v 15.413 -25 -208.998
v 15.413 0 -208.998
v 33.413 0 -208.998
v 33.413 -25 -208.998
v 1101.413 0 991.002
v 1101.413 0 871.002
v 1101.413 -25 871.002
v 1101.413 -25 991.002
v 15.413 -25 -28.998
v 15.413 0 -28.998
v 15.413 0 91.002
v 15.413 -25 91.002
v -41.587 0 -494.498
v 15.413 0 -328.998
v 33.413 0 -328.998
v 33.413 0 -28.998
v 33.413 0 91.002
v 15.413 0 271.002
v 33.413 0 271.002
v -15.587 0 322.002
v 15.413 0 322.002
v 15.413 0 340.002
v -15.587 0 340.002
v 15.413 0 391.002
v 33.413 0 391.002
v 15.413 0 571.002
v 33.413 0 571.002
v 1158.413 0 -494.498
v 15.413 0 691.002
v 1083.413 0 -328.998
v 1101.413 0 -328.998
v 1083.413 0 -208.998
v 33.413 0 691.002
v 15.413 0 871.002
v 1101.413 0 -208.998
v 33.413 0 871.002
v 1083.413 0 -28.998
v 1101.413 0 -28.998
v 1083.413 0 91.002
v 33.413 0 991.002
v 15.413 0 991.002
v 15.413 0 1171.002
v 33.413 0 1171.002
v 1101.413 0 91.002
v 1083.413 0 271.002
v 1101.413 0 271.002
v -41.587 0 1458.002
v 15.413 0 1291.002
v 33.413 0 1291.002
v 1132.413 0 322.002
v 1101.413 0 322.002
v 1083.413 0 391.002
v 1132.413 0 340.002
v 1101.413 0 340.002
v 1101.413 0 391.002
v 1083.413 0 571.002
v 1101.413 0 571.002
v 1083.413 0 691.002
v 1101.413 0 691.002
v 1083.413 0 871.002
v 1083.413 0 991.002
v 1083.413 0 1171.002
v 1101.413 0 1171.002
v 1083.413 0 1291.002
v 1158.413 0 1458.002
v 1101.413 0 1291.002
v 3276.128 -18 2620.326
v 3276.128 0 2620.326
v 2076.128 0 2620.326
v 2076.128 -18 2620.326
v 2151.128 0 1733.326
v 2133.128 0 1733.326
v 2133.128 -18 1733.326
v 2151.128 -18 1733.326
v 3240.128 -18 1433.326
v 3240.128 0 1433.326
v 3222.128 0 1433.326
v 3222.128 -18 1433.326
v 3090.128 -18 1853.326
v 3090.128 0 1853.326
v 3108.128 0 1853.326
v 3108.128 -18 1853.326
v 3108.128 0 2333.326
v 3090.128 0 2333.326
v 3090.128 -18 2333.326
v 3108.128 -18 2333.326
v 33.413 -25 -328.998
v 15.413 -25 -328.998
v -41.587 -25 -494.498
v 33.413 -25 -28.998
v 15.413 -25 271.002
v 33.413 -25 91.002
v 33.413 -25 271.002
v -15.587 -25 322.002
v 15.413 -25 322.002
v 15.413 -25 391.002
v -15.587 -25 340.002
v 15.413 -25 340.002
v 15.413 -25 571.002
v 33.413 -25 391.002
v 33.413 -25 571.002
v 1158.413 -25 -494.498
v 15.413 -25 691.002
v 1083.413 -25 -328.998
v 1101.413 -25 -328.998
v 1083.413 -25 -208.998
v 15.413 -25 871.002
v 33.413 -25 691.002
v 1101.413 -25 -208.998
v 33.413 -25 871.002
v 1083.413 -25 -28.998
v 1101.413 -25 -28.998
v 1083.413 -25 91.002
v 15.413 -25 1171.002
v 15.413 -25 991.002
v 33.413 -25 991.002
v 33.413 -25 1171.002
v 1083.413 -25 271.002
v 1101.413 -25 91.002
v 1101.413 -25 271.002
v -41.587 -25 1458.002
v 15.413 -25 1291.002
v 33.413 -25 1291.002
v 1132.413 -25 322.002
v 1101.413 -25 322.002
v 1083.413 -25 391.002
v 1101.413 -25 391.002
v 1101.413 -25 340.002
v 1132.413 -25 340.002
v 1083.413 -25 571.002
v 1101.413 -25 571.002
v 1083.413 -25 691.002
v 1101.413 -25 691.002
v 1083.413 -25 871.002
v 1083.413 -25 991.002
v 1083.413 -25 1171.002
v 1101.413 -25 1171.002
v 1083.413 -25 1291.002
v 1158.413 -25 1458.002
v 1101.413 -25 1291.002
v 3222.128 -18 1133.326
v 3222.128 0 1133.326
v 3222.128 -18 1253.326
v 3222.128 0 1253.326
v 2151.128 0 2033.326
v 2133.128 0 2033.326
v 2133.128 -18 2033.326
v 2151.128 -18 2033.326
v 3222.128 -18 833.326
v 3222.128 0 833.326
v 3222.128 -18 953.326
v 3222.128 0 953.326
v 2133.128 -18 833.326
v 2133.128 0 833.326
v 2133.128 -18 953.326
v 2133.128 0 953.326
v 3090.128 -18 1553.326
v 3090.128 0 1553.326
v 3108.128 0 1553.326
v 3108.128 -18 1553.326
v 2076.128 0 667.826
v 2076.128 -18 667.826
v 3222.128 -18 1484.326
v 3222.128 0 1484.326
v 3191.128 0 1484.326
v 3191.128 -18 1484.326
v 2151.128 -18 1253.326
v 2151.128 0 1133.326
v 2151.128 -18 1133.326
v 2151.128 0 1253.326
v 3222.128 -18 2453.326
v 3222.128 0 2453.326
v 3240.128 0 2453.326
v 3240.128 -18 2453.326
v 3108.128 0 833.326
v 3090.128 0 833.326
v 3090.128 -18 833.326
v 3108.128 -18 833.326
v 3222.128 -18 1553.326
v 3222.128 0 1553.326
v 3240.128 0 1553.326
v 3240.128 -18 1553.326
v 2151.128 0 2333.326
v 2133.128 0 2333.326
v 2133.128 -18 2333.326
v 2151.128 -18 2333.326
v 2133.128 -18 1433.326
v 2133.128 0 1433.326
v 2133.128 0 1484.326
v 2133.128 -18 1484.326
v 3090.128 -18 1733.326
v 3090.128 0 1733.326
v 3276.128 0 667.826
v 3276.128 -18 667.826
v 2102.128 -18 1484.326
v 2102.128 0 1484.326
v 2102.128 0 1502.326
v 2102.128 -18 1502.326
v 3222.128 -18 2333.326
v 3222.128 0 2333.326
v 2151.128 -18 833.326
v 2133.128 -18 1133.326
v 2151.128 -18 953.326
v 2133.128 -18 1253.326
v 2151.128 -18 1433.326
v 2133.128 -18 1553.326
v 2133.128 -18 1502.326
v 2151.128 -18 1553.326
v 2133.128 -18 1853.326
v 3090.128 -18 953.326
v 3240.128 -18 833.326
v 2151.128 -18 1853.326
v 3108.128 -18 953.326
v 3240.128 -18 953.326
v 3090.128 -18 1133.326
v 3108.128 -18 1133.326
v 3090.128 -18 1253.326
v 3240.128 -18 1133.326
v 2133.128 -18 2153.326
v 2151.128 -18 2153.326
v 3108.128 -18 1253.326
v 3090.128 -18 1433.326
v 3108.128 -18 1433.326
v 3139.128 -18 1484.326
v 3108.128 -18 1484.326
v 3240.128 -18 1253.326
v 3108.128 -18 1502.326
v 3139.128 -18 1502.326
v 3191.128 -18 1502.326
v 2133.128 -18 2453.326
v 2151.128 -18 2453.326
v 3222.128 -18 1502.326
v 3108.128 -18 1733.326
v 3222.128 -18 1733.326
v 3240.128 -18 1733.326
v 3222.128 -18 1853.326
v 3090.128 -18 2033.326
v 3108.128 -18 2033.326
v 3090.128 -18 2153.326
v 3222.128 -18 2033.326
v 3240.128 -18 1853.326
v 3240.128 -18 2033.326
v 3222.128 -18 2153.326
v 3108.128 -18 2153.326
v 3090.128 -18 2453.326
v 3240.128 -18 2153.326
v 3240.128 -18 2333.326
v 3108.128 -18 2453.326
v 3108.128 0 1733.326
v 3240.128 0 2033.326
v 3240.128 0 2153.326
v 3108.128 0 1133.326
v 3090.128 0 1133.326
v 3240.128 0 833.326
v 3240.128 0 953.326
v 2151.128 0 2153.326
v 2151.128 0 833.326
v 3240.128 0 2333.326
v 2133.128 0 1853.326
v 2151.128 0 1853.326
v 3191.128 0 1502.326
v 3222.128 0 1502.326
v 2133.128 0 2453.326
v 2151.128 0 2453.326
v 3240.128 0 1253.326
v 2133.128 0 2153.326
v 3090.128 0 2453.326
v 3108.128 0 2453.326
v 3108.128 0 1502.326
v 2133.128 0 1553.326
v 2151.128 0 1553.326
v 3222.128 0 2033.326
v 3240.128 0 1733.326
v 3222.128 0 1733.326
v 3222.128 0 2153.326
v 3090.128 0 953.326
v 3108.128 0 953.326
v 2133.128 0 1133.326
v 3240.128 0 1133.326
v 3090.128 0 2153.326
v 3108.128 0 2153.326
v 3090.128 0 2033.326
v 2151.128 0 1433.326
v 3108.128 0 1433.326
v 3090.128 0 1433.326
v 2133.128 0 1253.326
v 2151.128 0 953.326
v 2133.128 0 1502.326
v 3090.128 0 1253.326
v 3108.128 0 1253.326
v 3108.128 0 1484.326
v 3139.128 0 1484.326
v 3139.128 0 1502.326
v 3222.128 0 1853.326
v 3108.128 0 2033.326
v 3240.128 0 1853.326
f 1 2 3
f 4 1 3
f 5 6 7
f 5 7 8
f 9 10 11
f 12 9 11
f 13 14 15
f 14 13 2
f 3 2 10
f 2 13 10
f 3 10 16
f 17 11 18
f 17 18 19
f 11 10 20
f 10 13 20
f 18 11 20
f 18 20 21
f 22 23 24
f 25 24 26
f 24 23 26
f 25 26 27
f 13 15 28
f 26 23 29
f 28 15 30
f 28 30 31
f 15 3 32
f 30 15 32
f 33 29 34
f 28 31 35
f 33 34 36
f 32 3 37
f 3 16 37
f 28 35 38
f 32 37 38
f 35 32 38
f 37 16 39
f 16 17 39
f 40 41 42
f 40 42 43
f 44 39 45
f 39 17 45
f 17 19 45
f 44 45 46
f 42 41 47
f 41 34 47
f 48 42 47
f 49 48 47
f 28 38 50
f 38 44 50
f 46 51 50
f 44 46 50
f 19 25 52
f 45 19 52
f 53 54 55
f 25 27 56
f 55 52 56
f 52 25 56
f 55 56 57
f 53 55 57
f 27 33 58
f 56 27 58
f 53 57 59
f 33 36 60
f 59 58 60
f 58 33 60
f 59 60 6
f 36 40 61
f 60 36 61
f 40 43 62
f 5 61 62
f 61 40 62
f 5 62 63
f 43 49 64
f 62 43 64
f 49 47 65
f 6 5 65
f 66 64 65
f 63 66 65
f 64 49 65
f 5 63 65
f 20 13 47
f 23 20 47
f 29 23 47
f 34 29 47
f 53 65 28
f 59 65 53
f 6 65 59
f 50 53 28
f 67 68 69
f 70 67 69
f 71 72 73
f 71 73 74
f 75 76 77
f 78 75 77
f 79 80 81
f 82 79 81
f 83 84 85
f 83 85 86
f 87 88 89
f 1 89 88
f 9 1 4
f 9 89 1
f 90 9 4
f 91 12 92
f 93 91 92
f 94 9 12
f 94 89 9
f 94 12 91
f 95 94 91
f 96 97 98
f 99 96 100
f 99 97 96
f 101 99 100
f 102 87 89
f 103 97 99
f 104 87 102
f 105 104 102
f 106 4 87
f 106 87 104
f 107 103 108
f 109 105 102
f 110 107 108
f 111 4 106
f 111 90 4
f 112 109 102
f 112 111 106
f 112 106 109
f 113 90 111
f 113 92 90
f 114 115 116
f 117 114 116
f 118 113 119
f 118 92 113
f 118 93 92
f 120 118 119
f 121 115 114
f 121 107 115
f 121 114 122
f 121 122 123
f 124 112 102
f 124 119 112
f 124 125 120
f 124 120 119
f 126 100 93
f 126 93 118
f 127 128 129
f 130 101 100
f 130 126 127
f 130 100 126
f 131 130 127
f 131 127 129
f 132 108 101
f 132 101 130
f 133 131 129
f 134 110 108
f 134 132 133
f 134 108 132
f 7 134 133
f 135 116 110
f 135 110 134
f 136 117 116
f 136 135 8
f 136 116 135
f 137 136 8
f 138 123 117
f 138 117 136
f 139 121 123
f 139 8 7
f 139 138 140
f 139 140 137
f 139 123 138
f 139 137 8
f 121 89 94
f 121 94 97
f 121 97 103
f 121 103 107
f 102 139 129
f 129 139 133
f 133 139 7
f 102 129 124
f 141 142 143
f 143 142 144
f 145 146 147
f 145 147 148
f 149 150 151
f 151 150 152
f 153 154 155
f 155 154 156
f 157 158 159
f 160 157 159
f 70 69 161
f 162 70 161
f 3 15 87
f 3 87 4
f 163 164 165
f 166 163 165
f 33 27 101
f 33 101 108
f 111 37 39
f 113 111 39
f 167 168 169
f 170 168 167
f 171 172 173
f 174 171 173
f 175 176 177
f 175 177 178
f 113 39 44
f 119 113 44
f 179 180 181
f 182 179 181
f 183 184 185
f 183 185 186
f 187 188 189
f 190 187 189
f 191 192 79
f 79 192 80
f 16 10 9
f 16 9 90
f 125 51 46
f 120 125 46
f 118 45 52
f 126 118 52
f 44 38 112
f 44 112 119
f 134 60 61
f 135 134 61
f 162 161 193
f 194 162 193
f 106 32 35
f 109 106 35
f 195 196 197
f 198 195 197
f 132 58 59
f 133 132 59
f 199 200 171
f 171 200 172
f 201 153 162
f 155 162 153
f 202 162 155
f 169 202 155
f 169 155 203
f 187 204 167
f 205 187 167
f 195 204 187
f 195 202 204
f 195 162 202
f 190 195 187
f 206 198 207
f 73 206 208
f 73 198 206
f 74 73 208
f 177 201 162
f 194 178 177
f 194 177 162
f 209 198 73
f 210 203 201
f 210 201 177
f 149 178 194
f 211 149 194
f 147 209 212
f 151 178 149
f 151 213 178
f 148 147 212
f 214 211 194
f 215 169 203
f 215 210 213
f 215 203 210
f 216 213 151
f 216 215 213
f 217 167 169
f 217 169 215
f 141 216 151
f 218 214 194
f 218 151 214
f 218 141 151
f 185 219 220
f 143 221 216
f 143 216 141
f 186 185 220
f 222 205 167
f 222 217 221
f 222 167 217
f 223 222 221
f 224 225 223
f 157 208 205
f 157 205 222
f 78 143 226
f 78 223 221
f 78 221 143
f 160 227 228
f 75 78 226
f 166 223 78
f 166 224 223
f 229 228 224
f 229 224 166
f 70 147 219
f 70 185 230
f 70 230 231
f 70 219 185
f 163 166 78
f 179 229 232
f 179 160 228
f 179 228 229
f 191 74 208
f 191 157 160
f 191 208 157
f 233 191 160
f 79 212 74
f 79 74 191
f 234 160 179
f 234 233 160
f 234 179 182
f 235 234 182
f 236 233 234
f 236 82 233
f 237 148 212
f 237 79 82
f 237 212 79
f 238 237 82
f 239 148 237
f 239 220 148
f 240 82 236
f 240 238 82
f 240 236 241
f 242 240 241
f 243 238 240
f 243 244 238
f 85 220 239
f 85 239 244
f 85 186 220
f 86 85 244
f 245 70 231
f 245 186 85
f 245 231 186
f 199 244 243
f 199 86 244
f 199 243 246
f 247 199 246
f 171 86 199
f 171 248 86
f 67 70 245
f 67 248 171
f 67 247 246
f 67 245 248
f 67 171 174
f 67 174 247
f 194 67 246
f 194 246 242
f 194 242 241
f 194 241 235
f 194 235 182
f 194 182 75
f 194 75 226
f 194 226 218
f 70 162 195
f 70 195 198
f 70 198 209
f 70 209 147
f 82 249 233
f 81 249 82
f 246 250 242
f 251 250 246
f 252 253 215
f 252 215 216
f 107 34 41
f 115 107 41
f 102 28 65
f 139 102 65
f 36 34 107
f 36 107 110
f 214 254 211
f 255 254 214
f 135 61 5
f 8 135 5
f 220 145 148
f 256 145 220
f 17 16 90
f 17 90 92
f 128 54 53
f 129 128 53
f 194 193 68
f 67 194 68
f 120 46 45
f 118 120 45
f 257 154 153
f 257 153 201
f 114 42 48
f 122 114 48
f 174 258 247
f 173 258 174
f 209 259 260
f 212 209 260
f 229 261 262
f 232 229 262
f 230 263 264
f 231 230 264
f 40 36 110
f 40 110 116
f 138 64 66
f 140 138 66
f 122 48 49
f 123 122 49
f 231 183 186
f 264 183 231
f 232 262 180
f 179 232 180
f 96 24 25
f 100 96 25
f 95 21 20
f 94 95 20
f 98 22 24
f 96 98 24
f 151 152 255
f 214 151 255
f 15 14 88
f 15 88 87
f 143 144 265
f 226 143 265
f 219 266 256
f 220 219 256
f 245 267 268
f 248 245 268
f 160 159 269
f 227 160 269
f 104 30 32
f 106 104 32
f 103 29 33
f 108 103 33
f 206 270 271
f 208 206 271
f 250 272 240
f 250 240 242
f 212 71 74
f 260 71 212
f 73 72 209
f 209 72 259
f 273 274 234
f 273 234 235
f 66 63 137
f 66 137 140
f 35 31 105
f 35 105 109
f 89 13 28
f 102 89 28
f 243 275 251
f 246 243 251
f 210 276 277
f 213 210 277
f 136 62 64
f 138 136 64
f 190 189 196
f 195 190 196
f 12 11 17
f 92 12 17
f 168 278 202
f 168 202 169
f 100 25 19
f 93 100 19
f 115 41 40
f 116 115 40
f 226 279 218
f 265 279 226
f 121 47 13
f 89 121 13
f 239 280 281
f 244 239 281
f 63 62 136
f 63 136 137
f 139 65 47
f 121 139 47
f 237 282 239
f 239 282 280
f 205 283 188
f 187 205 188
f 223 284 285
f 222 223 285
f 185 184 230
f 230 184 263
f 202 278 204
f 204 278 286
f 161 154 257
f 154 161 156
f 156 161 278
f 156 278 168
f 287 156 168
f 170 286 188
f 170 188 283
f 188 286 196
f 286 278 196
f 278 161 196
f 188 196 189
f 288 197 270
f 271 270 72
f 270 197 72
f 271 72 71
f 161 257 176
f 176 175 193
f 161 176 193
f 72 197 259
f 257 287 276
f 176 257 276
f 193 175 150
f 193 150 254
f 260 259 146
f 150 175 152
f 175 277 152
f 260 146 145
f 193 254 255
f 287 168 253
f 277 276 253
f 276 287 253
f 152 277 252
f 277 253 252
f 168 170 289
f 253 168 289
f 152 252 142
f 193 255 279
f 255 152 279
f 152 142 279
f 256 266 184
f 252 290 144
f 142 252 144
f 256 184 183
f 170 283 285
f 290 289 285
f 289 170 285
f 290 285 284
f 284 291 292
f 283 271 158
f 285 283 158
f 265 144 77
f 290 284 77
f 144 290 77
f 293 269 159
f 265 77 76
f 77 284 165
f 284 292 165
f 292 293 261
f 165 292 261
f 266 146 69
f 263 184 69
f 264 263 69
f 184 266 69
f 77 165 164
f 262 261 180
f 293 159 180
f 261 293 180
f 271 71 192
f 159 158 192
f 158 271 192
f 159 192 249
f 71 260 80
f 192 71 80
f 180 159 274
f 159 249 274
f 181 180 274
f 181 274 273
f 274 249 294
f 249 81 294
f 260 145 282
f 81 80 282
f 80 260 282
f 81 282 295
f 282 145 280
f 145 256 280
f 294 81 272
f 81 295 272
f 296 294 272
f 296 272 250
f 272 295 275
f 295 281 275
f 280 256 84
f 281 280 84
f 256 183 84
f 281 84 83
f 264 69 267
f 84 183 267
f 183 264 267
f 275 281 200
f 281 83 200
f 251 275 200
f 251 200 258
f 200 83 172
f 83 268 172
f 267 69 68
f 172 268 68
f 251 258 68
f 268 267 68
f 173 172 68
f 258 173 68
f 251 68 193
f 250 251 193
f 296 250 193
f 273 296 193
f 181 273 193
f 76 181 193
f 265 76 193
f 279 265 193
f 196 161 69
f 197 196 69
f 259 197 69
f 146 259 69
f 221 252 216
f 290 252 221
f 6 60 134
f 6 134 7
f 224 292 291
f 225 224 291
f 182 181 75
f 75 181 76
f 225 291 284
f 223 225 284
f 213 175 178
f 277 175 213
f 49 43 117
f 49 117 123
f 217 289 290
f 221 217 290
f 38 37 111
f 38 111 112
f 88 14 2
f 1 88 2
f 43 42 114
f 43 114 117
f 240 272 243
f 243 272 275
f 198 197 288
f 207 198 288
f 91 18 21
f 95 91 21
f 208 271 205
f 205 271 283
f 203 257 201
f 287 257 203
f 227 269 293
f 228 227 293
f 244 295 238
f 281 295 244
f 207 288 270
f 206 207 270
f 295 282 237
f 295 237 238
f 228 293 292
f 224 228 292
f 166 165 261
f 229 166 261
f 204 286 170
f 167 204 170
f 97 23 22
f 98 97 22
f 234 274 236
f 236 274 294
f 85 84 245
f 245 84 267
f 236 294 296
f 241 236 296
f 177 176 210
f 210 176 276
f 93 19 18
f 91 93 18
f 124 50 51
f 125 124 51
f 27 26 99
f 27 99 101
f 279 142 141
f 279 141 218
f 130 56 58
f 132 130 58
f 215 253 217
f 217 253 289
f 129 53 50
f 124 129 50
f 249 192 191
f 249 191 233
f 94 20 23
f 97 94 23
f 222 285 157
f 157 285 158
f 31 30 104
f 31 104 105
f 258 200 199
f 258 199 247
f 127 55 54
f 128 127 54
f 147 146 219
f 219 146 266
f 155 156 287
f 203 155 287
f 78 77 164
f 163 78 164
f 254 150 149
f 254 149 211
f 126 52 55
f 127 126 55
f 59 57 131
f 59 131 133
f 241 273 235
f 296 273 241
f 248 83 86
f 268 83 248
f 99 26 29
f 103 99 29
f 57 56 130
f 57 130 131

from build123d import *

# Parameters (mm, degrees)
F0_W     = 18
F0_H     = 120
F1_DEPTH = 25
F2_W     = 18
F2_H     = 120
F3_DEPTH = 18


with BuildPart() as f1:
    # F0 (on Front) → F1 (new body)
    with BuildSketch(Plane.XZ):
        Polygon((1083.41291, 1458.001808), (33.41291, 1458.001808), (15.41291, 1458.001808), (-41.58709, 1458.001808), (-41.58709, -494.498192), (15.41291, -494.498192), (33.41291, -494.498192), (558.41291, -494.498192), (1083.41291, -494.498192), (1101.41291, -494.498192), (1158.41291, -494.498192), (1158.41291, 1458.001808), (1101.41291, 1458.001808), align=None)
        with Locations((24.41291, -268.998192)):
            Rectangle(F0_W, F0_H, mode=Mode.SUBTRACT)
        with Locations((24.41291, 31.001808)):
            Rectangle(F0_W, F0_H, mode=Mode.SUBTRACT)
        Polygon((-15.58709, 322.001808), (-15.58709, 340.001808), (15.41291, 340.001808), (15.41291, 391.001808), (33.41291, 391.001808), (33.41291, 331.001808), (33.41291, 271.001808), (15.41291, 271.001808), (15.41291, 322.001808), align=None, mode=Mode.SUBTRACT)
        with Locations((1092.41291, -268.998192)):
            Rectangle(F0_W, F0_H, mode=Mode.SUBTRACT)
        with Locations((1092.41291, 31.001808)):
            Rectangle(F0_W, F0_H, mode=Mode.SUBTRACT)
        Polygon((1083.41291, 271.001808), (1083.41291, 331.001808), (1083.41291, 391.001808), (1101.41291, 391.001808), (1101.41291, 340.001808), (1132.41291, 340.001808), (1132.41291, 322.001808), (1101.41291, 322.001808), (1101.41291, 271.001808), align=None, mode=Mode.SUBTRACT)
        with Locations((24.41291, 631.001808)):
            Rectangle(F0_W, F0_H, mode=Mode.SUBTRACT)
        with Locations((24.41291, 931.001808)):
            Rectangle(F0_W, F0_H, mode=Mode.SUBTRACT)
        with Locations((24.41291, 1231.001808)):
            Rectangle(F0_W, F0_H, mode=Mode.SUBTRACT)
        with Locations((1092.41291, 631.001808)):
            Rectangle(F0_W, F0_H, mode=Mode.SUBTRACT)
        with Locations((1092.41291, 931.001808)):
            Rectangle(F0_W, F0_H, mode=Mode.SUBTRACT)
        with Locations((1092.41291, 1231.001808)):
            Rectangle(F0_W, F0_H, mode=Mode.SUBTRACT)
    extrude(amount=F1_DEPTH)


with BuildPart() as f3:
    # F2 (on Front) → F3 (new body)
    with BuildSketch(Plane.XZ):
        Polygon((2076.127506, 667.826232), (2133.127506, 667.826232), (2151.127506, 667.826232), (3090.127506, 667.826232), (3108.127506, 667.826232), (3222.127506, 667.826232), (3240.127506, 667.826232), (3276.127506, 667.826232), (3276.127506, 2620.326232), (3240.127506, 2620.326232), (3222.127506, 2620.326232), (3108.127506, 2620.326232), (3090.127506, 2620.326232), (2151.127506, 2620.326232), (2133.127506, 2620.326232), (2076.127506, 2620.326232), align=None)
        with Locations((2142.127506, 893.326232)):
            Rectangle(F2_W, F2_H, mode=Mode.SUBTRACT)
        with Locations((2142.127506, 1193.326232)):
            Rectangle(F2_W, F2_H, mode=Mode.SUBTRACT)
        Polygon((2102.127506, 1484.326232), (2102.127506, 1502.326232), (2133.127506, 1502.326232), (2133.127506, 1553.326232), (2151.127506, 1553.326232), (2151.127506, 1433.326232), (2133.127506, 1433.326232), (2133.127506, 1484.326232), align=None, mode=Mode.SUBTRACT)
        with Locations((3099.127506, 893.326232)):
            Rectangle(F2_W, F2_H, mode=Mode.SUBTRACT)
        with Locations((3231.127506, 893.326232)):
            Rectangle(F2_W, F2_H, mode=Mode.SUBTRACT)
        with Locations((3099.127506, 1193.326232)):
            Rectangle(F2_W, F2_H, mode=Mode.SUBTRACT)
        with Locations((3231.127506, 1193.326232)):
            Rectangle(F2_W, F2_H, mode=Mode.SUBTRACT)
        Polygon((3108.127506, 1484.326232), (3108.127506, 1433.326232), (3090.127506, 1433.326232), (3090.127506, 1553.326232), (3108.127506, 1553.326232), (3108.127506, 1502.326232), (3139.127506, 1502.326232), (3139.127506, 1484.326232), align=None, mode=Mode.SUBTRACT)
        Polygon((3240.127506, 1433.326232), (3222.127506, 1433.326232), (3222.127506, 1484.326232), (3191.127506, 1484.326232), (3191.127506, 1502.326232), (3222.127506, 1502.326232), (3222.127506, 1553.326232), (3240.127506, 1553.326232), align=None, mode=Mode.SUBTRACT)
        with Locations((2142.127506, 1793.326232)):
            Rectangle(F2_W, F2_H, mode=Mode.SUBTRACT)
        with Locations((2142.127506, 2093.326232)):
            Rectangle(F2_W, F2_H, mode=Mode.SUBTRACT)
        with Locations((2142.127506, 2393.326232)):
            Rectangle(F2_W, F2_H, mode=Mode.SUBTRACT)
        with Locations((3099.127506, 1793.326232)):
            Rectangle(F2_W, F2_H, mode=Mode.SUBTRACT)
        with Locations((3231.127506, 1793.326232)):
            Rectangle(F2_W, F2_H, mode=Mode.SUBTRACT)
        with Locations((3099.127506, 2093.326232)):
            Rectangle(F2_W, F2_H, mode=Mode.SUBTRACT)
        with Locations((3231.127506, 2093.326232)):
            Rectangle(F2_W, F2_H, mode=Mode.SUBTRACT)
        with Locations((3099.127506, 2393.326232)):
            Rectangle(F2_W, F2_H, mode=Mode.SUBTRACT)
        with Locations((3231.127506, 2393.326232)):
            Rectangle(F2_W, F2_H, mode=Mode.SUBTRACT)
    extrude(amount=F3_DEPTH)


solid = Compound([f1.part, f3.part])
